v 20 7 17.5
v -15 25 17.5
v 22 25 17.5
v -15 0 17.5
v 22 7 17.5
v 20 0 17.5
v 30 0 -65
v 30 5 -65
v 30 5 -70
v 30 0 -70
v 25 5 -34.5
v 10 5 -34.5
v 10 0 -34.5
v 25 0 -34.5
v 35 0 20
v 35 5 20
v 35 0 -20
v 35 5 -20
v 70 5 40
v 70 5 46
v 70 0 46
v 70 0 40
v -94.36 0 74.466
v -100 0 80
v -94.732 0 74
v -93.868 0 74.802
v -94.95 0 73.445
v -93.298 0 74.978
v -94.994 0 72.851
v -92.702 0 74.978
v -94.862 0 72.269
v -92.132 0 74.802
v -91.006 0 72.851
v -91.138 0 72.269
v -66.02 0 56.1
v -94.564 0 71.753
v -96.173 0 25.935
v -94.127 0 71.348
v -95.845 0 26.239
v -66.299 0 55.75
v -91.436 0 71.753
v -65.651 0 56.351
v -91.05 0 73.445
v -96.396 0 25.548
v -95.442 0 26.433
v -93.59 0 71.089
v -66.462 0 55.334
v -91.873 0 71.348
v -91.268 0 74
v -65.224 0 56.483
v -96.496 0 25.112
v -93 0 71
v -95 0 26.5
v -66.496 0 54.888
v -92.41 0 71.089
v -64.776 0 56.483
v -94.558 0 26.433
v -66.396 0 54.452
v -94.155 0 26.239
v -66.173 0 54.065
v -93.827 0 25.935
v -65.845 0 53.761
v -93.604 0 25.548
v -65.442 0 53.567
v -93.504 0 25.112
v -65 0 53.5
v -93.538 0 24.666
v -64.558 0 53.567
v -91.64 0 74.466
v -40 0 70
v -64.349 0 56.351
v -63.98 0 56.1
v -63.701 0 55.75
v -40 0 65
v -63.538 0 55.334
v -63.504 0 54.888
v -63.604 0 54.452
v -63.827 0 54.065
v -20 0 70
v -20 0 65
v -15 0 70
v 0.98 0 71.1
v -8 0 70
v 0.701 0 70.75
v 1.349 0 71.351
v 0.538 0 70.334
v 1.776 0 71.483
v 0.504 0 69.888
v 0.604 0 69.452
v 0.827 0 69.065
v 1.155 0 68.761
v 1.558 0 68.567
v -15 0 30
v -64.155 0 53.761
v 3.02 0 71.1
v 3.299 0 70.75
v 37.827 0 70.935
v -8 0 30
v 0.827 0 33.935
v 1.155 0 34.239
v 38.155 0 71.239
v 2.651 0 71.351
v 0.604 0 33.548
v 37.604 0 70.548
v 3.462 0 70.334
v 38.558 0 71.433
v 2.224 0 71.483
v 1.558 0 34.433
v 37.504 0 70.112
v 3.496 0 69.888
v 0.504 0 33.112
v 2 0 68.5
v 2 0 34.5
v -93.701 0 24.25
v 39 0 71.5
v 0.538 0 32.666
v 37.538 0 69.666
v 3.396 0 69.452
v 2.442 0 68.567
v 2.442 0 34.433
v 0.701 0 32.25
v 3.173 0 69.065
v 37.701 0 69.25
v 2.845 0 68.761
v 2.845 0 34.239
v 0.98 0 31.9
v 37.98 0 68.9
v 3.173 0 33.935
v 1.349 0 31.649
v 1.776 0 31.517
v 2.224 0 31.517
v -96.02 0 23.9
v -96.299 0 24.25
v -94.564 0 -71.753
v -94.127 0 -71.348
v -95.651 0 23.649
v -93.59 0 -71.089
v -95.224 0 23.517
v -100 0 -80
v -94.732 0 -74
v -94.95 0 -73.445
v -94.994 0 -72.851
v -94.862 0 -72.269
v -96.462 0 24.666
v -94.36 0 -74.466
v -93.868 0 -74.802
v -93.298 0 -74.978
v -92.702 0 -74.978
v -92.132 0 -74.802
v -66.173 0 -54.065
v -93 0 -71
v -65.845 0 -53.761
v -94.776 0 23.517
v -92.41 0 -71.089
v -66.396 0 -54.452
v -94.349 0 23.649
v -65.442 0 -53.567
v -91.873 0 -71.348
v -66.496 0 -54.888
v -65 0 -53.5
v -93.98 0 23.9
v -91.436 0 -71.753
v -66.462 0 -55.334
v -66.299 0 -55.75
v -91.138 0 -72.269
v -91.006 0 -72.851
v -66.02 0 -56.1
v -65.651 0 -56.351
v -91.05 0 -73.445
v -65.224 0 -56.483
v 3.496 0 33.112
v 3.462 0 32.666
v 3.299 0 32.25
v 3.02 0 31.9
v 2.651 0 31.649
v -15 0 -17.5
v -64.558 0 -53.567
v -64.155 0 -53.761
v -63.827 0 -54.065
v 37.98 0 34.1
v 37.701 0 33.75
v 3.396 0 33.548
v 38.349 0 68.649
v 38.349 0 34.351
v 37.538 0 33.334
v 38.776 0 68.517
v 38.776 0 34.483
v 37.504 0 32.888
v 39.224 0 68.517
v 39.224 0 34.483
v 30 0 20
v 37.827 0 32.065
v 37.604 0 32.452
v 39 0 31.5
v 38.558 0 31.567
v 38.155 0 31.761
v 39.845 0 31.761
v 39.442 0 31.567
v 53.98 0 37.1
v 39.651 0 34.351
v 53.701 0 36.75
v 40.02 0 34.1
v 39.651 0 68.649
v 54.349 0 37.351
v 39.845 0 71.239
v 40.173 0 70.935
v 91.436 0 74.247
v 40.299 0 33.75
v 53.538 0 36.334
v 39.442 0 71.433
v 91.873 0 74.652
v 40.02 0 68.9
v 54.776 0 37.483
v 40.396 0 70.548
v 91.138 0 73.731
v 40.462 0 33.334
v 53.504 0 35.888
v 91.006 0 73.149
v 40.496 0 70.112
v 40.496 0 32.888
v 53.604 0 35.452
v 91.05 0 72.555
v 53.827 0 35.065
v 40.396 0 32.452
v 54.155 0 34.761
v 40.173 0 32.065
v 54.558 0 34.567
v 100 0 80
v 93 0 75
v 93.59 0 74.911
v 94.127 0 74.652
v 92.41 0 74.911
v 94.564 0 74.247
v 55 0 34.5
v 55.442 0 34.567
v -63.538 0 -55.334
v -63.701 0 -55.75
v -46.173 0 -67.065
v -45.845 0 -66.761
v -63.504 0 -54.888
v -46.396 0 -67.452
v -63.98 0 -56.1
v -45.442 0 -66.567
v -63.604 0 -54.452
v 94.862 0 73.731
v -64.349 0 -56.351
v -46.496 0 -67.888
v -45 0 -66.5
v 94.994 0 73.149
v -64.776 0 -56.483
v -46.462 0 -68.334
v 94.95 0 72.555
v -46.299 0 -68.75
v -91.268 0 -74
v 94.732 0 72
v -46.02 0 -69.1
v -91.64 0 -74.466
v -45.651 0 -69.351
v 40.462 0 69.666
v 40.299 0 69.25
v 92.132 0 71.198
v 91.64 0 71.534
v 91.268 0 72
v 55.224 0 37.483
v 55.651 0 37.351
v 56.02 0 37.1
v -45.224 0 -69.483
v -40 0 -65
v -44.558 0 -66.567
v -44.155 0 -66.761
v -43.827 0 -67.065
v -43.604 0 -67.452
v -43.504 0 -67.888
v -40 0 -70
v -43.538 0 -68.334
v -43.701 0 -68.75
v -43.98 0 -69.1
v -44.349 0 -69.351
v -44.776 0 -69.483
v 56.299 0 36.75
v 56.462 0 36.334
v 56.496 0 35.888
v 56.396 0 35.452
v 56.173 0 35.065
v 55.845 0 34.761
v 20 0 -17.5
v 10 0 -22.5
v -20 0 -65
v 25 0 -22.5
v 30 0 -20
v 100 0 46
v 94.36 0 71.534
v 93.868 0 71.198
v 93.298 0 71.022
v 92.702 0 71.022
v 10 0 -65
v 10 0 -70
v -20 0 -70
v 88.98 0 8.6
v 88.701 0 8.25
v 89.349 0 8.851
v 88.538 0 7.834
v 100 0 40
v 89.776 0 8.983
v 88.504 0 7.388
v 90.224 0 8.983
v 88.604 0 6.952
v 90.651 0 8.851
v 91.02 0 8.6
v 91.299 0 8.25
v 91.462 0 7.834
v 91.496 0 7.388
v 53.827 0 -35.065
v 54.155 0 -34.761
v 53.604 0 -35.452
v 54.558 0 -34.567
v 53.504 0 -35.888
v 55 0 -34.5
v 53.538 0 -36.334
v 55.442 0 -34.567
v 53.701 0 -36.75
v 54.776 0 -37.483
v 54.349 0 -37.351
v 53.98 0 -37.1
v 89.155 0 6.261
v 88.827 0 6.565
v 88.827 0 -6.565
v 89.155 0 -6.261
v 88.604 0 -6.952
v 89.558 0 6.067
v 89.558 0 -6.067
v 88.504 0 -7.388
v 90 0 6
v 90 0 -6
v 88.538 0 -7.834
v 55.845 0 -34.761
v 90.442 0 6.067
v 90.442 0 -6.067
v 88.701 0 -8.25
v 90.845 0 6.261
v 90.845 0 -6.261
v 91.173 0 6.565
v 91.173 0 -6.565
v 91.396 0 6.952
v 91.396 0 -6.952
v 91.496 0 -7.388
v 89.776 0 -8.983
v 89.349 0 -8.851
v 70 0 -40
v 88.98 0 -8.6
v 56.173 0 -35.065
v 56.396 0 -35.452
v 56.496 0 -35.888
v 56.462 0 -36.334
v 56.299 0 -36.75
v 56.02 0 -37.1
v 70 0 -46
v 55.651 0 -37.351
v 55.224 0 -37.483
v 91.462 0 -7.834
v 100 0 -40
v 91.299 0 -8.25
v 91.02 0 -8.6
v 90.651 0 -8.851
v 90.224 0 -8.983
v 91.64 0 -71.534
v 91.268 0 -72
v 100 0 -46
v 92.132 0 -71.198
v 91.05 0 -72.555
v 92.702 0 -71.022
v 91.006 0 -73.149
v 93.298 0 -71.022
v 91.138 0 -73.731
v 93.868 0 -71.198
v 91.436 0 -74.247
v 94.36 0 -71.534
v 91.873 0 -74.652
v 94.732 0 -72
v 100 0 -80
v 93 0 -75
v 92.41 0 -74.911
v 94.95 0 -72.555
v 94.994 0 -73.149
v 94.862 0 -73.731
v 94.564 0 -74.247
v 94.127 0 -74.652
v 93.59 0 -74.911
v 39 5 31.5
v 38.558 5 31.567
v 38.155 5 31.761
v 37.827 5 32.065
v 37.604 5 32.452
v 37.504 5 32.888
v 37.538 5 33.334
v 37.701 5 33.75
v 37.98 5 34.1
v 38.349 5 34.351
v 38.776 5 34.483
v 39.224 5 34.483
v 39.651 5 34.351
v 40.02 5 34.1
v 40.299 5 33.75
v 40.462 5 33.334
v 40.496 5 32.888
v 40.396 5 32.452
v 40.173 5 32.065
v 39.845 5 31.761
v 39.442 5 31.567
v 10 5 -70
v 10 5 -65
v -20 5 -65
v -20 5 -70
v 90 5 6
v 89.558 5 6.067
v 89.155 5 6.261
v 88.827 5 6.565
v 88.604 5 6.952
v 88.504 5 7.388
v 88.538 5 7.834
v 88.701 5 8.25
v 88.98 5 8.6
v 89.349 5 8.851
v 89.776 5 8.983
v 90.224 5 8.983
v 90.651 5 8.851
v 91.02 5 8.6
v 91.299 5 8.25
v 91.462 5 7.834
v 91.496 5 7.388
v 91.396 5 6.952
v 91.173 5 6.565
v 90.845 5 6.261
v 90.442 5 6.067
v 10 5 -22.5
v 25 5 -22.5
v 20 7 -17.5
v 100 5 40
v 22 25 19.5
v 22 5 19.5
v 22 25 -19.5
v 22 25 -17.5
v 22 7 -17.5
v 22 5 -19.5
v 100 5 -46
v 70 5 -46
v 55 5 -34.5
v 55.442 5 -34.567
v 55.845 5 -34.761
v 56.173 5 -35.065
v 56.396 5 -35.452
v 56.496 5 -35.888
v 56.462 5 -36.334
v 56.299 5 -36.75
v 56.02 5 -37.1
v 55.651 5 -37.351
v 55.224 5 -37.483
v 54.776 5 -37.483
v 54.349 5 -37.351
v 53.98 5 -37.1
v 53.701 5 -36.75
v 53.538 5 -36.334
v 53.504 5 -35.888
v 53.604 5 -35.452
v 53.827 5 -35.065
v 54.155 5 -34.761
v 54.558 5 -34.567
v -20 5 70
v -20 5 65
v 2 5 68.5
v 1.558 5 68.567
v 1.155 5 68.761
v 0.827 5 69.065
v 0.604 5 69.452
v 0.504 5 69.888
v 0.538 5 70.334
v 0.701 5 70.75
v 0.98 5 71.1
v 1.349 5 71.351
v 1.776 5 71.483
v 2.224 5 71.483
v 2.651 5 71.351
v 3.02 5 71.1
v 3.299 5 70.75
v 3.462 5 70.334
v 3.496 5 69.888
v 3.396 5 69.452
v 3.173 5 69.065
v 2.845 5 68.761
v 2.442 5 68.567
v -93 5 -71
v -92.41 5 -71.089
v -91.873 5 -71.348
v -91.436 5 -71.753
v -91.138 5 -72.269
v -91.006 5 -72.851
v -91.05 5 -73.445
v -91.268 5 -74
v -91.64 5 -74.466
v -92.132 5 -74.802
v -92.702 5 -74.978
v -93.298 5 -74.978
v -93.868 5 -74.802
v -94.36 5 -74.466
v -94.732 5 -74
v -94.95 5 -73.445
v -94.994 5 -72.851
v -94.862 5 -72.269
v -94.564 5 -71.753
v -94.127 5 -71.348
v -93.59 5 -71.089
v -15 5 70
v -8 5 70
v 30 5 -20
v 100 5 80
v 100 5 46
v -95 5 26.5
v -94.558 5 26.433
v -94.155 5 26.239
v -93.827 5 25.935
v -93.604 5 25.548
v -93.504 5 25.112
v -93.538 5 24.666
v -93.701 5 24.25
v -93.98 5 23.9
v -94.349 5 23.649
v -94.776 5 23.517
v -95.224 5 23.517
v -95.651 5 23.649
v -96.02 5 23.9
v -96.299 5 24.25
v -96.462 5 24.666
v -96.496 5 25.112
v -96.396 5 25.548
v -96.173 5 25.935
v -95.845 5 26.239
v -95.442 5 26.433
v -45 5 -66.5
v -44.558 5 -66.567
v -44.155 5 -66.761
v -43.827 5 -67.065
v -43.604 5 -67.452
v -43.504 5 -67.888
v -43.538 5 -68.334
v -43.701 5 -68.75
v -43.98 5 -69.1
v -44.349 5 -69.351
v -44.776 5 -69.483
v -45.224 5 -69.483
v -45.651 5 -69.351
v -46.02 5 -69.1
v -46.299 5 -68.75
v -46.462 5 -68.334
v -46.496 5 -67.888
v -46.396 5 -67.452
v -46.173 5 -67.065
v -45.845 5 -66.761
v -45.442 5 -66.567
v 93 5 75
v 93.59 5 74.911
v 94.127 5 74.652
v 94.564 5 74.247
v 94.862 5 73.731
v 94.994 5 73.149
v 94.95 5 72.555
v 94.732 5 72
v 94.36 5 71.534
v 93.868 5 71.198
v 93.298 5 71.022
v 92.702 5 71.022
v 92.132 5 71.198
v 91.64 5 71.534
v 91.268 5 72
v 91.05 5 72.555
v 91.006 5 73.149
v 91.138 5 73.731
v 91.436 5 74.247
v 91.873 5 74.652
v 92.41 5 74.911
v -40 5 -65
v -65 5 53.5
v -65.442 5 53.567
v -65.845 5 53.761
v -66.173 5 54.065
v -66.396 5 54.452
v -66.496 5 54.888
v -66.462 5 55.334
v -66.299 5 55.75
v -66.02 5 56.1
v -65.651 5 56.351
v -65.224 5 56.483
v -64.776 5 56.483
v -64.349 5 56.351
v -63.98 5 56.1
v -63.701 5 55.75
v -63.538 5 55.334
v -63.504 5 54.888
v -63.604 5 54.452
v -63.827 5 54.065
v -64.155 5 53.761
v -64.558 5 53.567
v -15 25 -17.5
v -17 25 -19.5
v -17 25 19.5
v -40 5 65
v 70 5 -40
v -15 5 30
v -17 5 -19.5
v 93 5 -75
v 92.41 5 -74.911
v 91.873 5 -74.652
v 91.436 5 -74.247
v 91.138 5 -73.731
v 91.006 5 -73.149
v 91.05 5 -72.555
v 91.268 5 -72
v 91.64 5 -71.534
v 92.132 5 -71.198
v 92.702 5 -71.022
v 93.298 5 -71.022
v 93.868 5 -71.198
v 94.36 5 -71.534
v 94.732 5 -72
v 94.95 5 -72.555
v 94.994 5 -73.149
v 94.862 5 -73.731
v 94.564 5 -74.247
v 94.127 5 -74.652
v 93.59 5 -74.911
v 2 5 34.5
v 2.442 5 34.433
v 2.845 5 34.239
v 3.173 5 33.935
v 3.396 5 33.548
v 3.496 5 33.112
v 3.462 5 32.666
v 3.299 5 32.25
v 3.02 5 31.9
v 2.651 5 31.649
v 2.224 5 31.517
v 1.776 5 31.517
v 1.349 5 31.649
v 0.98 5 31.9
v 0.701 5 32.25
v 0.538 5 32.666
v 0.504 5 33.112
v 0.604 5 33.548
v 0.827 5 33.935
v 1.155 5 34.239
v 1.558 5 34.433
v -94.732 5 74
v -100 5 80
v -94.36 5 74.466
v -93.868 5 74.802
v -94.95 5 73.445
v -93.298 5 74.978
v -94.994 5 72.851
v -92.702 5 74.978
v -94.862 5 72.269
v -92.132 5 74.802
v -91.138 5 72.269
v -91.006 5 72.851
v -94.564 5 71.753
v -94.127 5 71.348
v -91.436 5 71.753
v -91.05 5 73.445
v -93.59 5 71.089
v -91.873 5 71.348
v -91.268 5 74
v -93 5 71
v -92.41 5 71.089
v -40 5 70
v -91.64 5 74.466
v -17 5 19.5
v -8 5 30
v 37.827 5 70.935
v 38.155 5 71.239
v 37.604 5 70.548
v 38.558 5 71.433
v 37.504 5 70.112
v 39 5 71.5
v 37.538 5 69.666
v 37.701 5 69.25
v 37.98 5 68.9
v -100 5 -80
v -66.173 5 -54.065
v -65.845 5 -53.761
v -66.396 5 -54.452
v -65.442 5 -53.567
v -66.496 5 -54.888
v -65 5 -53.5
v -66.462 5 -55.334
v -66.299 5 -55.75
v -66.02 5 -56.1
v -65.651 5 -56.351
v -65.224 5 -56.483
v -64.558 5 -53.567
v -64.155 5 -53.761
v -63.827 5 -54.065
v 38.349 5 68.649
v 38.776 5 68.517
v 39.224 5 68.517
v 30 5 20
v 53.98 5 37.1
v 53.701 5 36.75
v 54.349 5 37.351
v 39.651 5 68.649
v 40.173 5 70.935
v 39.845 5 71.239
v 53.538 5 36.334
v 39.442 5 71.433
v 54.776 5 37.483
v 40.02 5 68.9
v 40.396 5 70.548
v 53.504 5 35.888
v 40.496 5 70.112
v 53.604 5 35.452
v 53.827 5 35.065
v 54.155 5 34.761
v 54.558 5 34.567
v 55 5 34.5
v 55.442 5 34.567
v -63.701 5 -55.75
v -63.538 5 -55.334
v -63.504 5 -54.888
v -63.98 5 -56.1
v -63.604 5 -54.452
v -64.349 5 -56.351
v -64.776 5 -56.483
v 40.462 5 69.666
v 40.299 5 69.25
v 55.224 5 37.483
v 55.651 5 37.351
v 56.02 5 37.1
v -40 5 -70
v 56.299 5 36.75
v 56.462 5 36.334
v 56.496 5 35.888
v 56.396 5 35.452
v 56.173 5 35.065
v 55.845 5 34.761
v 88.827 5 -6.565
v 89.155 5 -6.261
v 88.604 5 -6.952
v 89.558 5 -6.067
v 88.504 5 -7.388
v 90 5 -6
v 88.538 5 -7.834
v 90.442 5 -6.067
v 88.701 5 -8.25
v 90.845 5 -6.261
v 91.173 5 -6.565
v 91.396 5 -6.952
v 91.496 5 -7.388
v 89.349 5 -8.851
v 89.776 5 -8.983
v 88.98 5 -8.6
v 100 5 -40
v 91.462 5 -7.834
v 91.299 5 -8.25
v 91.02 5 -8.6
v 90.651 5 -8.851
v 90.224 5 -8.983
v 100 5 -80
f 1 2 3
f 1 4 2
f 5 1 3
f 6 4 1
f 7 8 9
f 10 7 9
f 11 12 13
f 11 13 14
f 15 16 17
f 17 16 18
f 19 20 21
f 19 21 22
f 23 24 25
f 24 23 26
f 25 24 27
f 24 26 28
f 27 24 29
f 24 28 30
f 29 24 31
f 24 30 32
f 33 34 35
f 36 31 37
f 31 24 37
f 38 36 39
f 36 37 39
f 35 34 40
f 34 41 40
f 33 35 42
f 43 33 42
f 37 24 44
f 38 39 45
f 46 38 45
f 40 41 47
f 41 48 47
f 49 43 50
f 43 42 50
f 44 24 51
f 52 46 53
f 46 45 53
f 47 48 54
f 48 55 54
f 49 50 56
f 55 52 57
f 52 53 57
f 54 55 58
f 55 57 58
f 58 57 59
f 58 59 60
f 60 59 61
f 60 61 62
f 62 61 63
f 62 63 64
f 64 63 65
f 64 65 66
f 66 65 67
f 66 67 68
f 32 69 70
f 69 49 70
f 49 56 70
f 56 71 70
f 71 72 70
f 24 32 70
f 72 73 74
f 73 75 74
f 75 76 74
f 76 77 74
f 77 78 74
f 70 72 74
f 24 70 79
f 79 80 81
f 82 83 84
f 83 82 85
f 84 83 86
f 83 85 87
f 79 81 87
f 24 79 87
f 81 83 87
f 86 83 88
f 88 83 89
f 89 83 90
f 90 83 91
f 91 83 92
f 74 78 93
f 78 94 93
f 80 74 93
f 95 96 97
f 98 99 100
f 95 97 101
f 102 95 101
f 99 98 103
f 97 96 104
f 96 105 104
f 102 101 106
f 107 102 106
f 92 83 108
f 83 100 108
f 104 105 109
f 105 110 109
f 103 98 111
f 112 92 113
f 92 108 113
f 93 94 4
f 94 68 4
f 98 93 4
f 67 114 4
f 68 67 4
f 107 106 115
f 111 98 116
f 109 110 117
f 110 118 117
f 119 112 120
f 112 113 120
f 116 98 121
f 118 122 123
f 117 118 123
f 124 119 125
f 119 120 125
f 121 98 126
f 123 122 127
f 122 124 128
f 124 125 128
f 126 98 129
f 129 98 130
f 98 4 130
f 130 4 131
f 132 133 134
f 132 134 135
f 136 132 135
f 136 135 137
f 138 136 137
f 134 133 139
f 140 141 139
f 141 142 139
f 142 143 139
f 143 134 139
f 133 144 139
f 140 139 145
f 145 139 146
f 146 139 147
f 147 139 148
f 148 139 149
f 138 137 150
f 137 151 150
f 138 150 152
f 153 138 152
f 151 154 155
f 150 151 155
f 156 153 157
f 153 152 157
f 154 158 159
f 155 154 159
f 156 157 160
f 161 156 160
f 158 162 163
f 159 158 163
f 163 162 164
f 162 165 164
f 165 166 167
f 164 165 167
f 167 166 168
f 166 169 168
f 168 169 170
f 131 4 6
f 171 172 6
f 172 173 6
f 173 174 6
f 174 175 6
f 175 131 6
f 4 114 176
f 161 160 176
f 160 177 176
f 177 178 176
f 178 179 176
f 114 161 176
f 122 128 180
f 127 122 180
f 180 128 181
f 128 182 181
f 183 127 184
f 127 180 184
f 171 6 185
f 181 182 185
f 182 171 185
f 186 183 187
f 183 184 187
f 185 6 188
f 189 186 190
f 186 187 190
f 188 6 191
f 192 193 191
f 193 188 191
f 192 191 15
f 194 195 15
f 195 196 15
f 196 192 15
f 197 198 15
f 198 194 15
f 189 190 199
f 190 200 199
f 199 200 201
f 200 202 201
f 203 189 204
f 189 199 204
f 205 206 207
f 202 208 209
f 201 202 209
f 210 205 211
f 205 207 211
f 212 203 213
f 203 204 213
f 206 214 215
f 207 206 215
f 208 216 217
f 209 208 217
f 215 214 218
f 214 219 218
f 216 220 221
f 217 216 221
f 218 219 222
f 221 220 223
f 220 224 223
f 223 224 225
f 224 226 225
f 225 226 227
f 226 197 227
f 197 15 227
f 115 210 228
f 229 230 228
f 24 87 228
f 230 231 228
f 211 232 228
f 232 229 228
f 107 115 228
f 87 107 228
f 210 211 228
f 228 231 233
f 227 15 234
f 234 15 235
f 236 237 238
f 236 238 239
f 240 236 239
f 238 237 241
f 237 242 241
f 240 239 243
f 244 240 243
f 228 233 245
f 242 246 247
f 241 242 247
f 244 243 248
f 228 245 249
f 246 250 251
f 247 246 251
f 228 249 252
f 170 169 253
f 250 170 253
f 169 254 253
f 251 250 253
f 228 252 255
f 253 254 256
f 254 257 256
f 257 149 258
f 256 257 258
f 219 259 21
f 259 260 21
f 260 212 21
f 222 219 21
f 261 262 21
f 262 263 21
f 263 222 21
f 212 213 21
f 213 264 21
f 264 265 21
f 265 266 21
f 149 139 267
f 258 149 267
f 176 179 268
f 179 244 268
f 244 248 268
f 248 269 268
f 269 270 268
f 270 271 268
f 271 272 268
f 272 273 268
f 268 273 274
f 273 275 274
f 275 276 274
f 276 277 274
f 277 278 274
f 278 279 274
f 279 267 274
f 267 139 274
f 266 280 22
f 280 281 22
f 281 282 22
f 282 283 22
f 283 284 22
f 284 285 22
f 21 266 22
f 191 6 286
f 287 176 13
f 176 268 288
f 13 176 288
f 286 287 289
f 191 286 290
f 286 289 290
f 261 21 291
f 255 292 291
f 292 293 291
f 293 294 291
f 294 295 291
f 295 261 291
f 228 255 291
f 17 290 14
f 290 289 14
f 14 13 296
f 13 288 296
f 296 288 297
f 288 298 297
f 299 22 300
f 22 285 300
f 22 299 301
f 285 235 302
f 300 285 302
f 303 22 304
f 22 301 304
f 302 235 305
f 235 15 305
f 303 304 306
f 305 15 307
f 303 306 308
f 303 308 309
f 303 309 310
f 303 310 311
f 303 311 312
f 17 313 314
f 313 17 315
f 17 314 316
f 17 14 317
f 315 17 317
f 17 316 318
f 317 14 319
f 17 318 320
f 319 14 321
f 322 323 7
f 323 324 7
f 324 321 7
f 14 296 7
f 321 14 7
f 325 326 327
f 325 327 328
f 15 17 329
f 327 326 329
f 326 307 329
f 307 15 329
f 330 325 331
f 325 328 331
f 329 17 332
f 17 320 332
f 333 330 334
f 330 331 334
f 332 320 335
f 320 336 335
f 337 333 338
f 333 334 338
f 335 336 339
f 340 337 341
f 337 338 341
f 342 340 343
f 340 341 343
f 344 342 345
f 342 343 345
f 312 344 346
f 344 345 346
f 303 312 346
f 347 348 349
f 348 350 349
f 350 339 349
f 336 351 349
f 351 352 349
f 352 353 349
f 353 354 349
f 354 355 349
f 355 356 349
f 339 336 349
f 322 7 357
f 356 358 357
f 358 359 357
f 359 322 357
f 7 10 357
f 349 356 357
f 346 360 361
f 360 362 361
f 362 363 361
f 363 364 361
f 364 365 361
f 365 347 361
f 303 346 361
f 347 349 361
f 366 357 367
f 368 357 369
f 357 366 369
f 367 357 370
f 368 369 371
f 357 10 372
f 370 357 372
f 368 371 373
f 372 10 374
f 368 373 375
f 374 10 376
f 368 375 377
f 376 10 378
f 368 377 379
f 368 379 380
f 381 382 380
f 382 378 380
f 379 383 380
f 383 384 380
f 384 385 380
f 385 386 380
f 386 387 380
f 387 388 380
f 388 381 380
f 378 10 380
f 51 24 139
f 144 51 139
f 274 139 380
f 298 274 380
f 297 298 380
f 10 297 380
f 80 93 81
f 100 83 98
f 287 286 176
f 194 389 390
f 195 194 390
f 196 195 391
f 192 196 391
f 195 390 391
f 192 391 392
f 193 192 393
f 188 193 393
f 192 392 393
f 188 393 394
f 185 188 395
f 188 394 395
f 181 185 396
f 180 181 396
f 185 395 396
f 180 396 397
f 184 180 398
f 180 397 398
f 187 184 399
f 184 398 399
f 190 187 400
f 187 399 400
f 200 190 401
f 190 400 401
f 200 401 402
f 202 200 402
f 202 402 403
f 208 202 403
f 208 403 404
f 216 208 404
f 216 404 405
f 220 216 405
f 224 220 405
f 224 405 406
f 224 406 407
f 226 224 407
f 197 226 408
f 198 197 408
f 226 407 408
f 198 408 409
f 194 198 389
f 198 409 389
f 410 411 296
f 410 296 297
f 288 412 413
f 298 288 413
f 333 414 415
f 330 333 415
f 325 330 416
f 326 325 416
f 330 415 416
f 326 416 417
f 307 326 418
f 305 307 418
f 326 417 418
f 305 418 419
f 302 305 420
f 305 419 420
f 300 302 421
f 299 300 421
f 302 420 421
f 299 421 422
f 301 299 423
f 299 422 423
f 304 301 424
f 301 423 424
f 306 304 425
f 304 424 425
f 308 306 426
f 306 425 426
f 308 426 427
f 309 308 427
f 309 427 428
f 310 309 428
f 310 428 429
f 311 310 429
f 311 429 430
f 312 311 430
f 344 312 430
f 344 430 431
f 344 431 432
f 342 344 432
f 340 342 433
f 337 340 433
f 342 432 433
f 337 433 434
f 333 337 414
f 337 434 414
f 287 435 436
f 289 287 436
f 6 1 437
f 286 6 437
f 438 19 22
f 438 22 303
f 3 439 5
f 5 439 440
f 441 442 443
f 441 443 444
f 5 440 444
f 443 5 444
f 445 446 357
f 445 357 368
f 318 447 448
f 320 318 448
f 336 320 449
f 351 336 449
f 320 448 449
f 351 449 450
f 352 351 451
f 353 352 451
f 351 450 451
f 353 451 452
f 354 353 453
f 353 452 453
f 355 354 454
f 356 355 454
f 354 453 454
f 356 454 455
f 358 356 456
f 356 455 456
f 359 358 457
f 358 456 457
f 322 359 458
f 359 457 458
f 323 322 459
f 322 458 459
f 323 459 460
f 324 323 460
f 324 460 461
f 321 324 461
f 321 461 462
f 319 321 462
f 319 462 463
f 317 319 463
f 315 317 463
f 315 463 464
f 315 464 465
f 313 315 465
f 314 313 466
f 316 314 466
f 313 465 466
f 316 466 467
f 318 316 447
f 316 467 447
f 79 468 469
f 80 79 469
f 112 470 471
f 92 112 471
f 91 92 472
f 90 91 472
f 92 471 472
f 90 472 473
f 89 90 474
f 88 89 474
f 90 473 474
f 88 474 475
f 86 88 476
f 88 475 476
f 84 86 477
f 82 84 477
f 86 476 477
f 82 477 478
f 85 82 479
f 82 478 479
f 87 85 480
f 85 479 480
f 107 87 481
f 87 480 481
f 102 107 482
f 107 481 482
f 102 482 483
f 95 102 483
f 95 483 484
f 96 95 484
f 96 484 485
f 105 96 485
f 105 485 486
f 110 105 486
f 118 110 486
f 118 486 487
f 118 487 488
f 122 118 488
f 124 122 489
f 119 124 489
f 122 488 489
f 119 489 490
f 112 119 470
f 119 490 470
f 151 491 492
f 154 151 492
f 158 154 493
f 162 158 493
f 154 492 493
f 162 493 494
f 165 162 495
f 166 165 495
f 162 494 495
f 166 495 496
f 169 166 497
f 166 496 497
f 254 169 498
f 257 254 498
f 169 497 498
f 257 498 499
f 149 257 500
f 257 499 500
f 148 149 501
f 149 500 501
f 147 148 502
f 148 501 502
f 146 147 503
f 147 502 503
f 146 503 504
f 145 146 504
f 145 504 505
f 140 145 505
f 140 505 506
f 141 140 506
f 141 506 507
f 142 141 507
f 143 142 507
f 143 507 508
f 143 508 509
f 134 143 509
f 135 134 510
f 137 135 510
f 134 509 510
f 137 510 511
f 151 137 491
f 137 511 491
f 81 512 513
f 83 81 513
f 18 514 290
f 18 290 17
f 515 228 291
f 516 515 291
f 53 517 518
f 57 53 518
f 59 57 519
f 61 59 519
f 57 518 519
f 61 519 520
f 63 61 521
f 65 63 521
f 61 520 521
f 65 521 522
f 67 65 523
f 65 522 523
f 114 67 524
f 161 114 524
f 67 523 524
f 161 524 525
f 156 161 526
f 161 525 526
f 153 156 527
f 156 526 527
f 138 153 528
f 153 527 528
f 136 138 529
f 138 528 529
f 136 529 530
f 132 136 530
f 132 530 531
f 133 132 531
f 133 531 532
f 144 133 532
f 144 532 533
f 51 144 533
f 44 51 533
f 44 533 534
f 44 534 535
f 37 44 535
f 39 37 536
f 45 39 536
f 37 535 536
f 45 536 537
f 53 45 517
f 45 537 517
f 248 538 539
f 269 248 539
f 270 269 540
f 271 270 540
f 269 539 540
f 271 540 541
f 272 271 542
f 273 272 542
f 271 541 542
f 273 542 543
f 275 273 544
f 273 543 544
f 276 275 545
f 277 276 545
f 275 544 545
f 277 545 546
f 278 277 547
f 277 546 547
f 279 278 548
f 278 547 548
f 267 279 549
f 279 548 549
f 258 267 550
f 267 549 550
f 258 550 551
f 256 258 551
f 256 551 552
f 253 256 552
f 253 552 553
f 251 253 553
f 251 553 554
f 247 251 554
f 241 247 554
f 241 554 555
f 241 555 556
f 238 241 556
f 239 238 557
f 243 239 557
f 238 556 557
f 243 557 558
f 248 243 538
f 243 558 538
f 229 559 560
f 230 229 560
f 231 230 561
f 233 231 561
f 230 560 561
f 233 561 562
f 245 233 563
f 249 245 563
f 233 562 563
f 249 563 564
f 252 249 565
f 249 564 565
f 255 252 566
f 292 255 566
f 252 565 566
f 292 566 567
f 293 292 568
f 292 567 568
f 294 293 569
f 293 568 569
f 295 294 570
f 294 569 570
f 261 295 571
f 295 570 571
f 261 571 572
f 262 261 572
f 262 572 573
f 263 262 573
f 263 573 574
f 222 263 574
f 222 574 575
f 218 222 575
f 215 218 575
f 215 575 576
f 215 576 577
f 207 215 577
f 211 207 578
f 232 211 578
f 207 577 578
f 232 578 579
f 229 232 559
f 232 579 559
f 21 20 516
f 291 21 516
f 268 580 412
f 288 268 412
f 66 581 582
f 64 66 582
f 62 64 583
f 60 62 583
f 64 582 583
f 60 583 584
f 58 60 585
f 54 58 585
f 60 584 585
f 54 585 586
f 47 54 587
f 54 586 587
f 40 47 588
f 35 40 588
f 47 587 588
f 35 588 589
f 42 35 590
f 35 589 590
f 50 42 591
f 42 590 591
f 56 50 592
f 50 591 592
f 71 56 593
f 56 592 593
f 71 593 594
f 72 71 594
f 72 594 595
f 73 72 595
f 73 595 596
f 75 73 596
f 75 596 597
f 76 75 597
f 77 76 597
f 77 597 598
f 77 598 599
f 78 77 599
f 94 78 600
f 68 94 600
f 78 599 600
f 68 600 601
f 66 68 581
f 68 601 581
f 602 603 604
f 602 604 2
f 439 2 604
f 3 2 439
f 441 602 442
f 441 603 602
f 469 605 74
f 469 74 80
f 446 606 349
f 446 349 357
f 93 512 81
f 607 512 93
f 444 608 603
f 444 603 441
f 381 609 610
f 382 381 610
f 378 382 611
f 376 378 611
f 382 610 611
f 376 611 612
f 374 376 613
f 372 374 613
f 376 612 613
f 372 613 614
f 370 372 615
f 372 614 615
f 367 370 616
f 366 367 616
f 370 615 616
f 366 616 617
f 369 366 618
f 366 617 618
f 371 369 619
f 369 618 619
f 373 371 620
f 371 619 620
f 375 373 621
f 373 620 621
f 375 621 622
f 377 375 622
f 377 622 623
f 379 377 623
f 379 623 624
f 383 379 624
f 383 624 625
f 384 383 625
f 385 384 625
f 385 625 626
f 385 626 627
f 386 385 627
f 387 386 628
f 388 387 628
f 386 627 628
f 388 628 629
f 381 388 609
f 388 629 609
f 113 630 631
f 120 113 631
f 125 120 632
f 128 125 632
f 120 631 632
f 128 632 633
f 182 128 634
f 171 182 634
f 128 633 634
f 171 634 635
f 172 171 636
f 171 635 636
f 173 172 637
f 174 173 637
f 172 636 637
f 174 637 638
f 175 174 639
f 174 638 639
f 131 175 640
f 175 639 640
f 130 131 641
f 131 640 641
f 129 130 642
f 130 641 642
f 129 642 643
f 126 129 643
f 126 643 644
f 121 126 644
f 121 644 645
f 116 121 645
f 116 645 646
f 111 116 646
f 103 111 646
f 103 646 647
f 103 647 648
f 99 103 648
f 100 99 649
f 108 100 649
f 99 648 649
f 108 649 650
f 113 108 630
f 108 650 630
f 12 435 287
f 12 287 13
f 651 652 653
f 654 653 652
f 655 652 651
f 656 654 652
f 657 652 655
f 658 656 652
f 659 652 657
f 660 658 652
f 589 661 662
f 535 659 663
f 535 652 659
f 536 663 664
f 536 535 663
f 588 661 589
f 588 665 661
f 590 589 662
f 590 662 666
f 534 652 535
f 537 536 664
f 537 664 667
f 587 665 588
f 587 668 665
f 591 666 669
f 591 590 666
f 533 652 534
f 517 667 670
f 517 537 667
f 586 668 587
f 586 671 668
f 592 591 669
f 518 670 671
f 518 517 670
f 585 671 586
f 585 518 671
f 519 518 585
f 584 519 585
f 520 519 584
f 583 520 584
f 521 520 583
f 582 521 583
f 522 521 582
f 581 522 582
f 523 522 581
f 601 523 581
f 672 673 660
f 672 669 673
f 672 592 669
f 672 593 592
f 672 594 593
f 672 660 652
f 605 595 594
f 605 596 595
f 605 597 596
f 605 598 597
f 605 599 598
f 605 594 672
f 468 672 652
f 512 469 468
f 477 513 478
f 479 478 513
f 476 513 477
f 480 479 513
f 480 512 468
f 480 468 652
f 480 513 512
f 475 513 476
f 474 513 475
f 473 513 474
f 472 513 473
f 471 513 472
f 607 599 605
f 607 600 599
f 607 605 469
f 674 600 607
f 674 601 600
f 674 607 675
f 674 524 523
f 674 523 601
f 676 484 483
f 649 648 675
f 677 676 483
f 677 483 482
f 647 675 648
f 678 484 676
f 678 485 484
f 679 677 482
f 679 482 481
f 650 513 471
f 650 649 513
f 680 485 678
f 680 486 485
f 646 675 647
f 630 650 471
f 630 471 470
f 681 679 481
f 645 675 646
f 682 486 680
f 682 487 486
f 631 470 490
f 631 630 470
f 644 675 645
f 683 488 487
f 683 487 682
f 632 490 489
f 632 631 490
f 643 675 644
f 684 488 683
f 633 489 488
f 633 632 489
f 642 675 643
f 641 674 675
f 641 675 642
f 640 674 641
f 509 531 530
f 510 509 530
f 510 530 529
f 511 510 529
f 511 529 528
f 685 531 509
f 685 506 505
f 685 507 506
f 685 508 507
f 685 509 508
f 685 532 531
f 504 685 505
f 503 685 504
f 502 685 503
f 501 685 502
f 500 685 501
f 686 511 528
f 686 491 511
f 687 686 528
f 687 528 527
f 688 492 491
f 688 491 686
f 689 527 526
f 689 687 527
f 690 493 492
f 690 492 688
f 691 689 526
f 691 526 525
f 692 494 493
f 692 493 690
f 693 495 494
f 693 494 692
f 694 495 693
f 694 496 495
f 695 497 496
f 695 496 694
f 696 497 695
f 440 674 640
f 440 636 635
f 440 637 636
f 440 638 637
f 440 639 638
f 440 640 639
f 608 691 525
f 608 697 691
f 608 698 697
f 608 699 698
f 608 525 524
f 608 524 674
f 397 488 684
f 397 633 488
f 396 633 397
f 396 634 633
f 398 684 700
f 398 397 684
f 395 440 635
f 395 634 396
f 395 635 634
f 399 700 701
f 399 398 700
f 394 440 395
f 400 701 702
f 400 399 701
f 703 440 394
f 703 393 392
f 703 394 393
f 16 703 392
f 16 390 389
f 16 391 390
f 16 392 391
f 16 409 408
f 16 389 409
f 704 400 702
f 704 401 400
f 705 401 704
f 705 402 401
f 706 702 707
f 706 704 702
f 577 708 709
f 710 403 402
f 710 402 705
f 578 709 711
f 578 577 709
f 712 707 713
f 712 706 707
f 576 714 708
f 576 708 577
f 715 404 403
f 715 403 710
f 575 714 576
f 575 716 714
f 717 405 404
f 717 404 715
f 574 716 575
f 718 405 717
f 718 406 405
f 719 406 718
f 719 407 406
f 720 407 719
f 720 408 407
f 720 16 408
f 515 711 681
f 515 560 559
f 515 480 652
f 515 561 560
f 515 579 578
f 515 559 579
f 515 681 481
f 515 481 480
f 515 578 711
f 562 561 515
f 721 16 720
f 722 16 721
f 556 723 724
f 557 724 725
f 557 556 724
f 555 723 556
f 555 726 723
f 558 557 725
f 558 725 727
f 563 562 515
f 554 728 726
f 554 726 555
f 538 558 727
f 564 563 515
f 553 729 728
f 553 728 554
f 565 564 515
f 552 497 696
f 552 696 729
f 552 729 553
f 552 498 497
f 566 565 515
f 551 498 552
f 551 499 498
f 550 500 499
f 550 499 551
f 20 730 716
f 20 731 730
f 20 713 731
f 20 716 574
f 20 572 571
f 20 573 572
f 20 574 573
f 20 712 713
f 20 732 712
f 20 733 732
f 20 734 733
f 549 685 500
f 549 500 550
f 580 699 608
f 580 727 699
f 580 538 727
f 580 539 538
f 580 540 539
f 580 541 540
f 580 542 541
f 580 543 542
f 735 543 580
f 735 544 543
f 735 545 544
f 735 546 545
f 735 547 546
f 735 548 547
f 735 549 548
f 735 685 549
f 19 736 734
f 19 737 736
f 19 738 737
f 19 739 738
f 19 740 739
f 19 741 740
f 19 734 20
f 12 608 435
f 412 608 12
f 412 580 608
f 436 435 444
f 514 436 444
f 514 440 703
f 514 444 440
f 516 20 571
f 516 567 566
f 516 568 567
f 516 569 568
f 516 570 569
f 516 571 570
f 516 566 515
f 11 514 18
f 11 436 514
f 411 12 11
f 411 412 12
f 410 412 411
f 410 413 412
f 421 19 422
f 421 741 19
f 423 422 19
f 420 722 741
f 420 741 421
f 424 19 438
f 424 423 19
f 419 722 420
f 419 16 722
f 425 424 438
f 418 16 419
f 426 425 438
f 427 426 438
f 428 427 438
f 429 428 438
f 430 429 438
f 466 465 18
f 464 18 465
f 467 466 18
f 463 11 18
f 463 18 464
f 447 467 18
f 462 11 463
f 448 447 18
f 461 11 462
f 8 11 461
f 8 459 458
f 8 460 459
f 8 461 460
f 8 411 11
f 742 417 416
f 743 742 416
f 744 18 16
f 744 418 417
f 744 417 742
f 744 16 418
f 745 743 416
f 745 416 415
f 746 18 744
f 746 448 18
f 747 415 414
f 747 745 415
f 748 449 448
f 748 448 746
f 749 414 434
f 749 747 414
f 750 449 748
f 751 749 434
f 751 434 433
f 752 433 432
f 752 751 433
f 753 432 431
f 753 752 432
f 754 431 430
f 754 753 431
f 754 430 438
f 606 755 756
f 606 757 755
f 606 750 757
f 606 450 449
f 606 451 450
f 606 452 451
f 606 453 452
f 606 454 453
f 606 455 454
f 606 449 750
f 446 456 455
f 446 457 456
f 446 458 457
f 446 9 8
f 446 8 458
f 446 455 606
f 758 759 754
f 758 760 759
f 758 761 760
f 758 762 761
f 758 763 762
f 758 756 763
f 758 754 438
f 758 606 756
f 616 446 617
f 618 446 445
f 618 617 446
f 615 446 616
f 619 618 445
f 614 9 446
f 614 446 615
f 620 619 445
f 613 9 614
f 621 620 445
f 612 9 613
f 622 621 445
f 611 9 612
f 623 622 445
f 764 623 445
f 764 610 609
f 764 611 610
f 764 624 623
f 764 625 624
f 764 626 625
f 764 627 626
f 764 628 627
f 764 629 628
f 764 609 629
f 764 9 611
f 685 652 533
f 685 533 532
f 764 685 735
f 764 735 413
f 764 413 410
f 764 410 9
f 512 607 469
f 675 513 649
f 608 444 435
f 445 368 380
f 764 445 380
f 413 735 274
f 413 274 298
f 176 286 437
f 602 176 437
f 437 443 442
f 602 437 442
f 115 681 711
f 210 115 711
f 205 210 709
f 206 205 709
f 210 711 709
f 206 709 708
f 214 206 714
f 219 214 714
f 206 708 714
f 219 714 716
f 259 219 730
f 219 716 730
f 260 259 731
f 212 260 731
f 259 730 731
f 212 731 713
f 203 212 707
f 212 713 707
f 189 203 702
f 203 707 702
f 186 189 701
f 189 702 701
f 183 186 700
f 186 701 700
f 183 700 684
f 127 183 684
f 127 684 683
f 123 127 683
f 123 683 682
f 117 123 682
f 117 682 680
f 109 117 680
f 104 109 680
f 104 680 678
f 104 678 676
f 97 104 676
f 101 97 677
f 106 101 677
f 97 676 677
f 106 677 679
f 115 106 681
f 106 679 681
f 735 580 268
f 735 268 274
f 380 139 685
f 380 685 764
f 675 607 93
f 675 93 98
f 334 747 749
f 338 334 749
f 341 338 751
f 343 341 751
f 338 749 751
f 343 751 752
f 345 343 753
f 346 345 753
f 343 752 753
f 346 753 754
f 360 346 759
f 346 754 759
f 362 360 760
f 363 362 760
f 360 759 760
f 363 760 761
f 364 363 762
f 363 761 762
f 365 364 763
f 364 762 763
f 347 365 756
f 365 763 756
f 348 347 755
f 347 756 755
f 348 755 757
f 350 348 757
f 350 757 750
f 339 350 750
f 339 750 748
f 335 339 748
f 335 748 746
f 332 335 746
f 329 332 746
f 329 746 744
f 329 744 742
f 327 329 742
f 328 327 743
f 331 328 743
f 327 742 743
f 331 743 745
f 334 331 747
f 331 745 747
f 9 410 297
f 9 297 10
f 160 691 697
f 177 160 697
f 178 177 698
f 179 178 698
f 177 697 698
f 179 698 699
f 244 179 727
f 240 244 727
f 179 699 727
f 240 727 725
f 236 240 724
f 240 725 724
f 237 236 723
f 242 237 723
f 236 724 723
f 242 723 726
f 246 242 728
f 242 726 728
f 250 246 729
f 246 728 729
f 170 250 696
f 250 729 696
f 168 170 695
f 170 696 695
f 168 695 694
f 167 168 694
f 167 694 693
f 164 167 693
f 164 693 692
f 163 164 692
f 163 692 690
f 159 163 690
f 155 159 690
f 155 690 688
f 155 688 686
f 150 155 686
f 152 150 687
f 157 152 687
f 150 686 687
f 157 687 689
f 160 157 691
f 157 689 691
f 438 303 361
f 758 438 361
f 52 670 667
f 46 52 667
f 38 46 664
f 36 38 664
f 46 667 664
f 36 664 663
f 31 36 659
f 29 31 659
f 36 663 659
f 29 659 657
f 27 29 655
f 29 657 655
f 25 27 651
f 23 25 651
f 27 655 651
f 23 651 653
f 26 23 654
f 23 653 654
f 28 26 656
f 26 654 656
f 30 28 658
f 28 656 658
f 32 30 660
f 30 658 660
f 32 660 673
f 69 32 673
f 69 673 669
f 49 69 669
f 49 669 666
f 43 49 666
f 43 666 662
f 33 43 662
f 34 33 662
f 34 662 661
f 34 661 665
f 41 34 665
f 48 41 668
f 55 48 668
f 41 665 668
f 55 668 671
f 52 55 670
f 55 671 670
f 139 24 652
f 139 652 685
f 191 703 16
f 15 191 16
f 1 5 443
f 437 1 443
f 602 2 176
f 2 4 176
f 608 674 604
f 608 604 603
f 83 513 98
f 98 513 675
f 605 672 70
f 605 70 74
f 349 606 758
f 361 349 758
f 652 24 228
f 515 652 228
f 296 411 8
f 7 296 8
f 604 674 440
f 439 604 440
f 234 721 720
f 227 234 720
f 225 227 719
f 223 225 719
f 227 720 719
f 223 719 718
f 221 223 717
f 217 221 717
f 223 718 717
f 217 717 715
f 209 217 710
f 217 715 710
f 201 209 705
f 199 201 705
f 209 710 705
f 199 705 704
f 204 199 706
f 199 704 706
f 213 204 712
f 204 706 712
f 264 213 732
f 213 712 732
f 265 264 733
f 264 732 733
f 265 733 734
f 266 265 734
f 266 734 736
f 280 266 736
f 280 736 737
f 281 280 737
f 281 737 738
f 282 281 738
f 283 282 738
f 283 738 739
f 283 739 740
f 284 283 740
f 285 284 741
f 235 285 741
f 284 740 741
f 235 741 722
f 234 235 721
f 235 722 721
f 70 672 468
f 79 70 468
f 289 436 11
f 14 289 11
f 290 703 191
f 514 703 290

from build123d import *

# Parameters (mm, degrees)
SKETCH1_W           = 200
SKETCH1_H           = 160
BOSS_EXTRUDE1_DEPTH = 5
SKETCH2_R           = 2
CUT_EXTRUDE1_DEPTH  = 5
SKETCH3_R           = 1.5
CUT_EXTRUDE4_DEPTH  = 5
SKETCH4_R           = 1.5
CUT_EXTRUDE5_DEPTH  = 5
SKETCH5_W           = 35
SKETCH5_H           = 35
CUT_EXTRUDE6_DEPTH  = 5
SKETCH7_W           = 7
SKETCH7_H           = 40
SKETCH7_W_2         = 5
SKETCH7_W_3         = 20
SKETCH7_H_2         = 5
CUT_EXTRUDE7_DEPTH  = 5
SKETCH8_W           = 15
SKETCH8_H           = 12
SKETCH8_W_2         = 30
SKETCH8_H_2         = 6
CUT_EXTRUDE8_DEPTH  = 5
SKETCH9_W           = 20
SKETCH9_H           = 5
CUT_EXTRUDE9_DEPTH  = 5
SKETCH10_R          = 1.5
CUT_EXTRUDE10_DEPTH = 5
SKETCH11_R          = 1.5
CUT_EXTRUDE11_DEPTH = 5
SKETCH12_R          = 1.5
CUT_EXTRUDE12_DEPTH = 5
SKETCH14_W          = 2
SKETCH14_H          = 35
BOSS_EXTRUDE3_DEPTH = 20
SKETCH15_W          = 39
SKETCH15_H          = 2
BOSS_EXTRUDE4_DEPTH = 20
SKETCH16_W          = 39
SKETCH16_H          = 2
BOSS_EXTRUDE5_DEPTH = 20
SKETCH17_W          = 35
SKETCH17_H          = 18
CUT_EXTRUDE13_DEPTH = 20


with BuildPart() as part:
    # Sketch1 → Boss-Extrude1 (new body)
    with BuildSketch(Plane(origin=(0, 0, 0), x_dir=(1, 0, 0), z_dir=(0, 1, 0))):
        Rectangle(SKETCH1_W, SKETCH1_H)
    extrude(amount=BOSS_EXTRUDE1_DEPTH)

    # Sketch2 → Cut-Extrude1 (cut)
    with BuildSketch(Plane(origin=(0, 5, 0), x_dir=(1, 0, 0), z_dir=(0, 1, 0))):
        with Locations(Location((-93, 73, 0), (0, 0, 270))):
            Circle(SKETCH2_R)
        with Locations(Location((93, 73, 0), (0, 0, 90))):
            Circle(SKETCH2_R)
        with Locations(Location((93, -73, 0), (0, 0, 270))):
            Circle(SKETCH2_R)
        with Locations(Location((-93, -73, 0), (0, 0, 90))):
            Circle(SKETCH2_R)
    extrude(amount=-CUT_EXTRUDE1_DEPTH, mode=Mode.SUBTRACT)

    # Sketch3 → Cut-Extrude4 (cut)
    with BuildSketch(Plane(origin=(0, 5, 0), x_dir=(1, 0, 0), z_dir=(0, 1, 0))):
        with Locations(Location((90, 7.5, 0), (0, 0, 270))):
            Circle(SKETCH3_R)
        with Locations(Location((90, -7.5, 0), (0, 0, 90))):
            Circle(SKETCH3_R)
    extrude(amount=-CUT_EXTRUDE4_DEPTH, mode=Mode.SUBTRACT)

    # Sketch4 → Cut-Extrude5 (cut)
    with BuildSketch(Plane(origin=(0, 5, 0), x_dir=(1, 0, 0), z_dir=(0, 1, 0))):
        with Locations(Location((55, 36, 0), (0, 0, 270))):
            Circle(SKETCH4_R)
        with Locations(Location((55, -36, 0), (0, 0, 90))):
            Circle(SKETCH4_R)
    extrude(amount=-CUT_EXTRUDE5_DEPTH, mode=Mode.SUBTRACT)

    # Sketch5 → Cut-Extrude6 (cut)
    with BuildSketch(Plane(origin=(0, 5, 0), x_dir=(1, 0, 0), z_dir=(0, 1, 0))):
        with Locations((2.5, 0)):
            Rectangle(SKETCH5_W, SKETCH5_H)
    extrude(amount=-CUT_EXTRUDE6_DEPTH, mode=Mode.SUBTRACT)

    # Sketch7 → Cut-Extrude7 (cut)
    with BuildSketch(Plane(origin=(0, 5, 0), x_dir=(1, 0, 0), z_dir=(0, 1, 0))):
        with Locations((-11.5, -50)):
            Rectangle(SKETCH7_W, SKETCH7_H)
        with Locations((32.5, 0)):
            Rectangle(SKETCH7_W_2, SKETCH7_H)
        with Locations((-30, 67.5)):
            Rectangle(SKETCH7_W_3, SKETCH7_H_2)
        with Locations((-30, -67.5)):
            Rectangle(SKETCH7_W_3, SKETCH7_H_2)
    extrude(amount=-CUT_EXTRUDE7_DEPTH, mode=Mode.SUBTRACT)

    # Sketch8 → Cut-Extrude8 (cut)
    with BuildSketch(Plane(origin=(0, 5, 0), x_dir=(1, 0, 0), z_dir=(0, 1, 0))):
        with Locations((17.5, 28.5)):
            Rectangle(SKETCH8_W, SKETCH8_H)
        with Locations((85, 43)):
            Rectangle(SKETCH8_W_2, SKETCH8_H_2)
        with Locations((85, -43)):
            Rectangle(SKETCH8_W_2, SKETCH8_H_2)
    extrude(amount=-CUT_EXTRUDE8_DEPTH, mode=Mode.SUBTRACT)

    # Sketch9 → Cut-Extrude9 (cut)
    with BuildSketch(Plane(origin=(0, 5, 0), x_dir=(1, 0, 0), z_dir=(0, 1, 0))):
        with Locations((20, 67.5)):
            Rectangle(SKETCH9_W, SKETCH9_H)
    extrude(amount=-CUT_EXTRUDE9_DEPTH, mode=Mode.SUBTRACT)

    # Sketch10 → Cut-Extrude10 (cut)
    with BuildSketch(Plane(origin=(0, 5, 0), x_dir=(1, 0, 0), z_dir=(0, 1, 0))):
        with Locations(Location((-95, -25, 0), (0, 0, 270))):
            Circle(SKETCH10_R)
        with Locations(Location((-45, 68, 0), (0, 0, 270))):
            Circle(SKETCH10_R)
    extrude(amount=-CUT_EXTRUDE10_DEPTH, mode=Mode.SUBTRACT)

    # Sketch11 → Cut-Extrude11 (cut)
    with BuildSketch(Plane(origin=(0, 5, 0), x_dir=(1, 0, 0), z_dir=(0, 1, 0))):
        with Locations(Location((2, -33, 0), (0, 0, 270))):
            Circle(SKETCH11_R)
        with Locations(Location((2, -70, 0), (0, 0, 90))):
            Circle(SKETCH11_R)
        with Locations(Location((39, -70, 0), (0, 0, 270))):
            Circle(SKETCH11_R)
        with Locations(Location((39, -33, 0), (0, 0, 90))):
            Circle(SKETCH11_R)
    extrude(amount=-CUT_EXTRUDE11_DEPTH, mode=Mode.SUBTRACT)

    # Sketch12 → Cut-Extrude12 (cut)
    with BuildSketch(Plane(origin=(0, 5, 0), x_dir=(1, 0, 0), z_dir=(0, 1, 0))):
        with Locations(Location((-65, 55, 0), (0, 0, 270))):
            Circle(SKETCH12_R)
        with Locations(Location((-65, -55, 0), (0, 0, 90))):
            Circle(SKETCH12_R)
    extrude(amount=-CUT_EXTRUDE12_DEPTH, mode=Mode.SUBTRACT)

    # Sketch14 → Boss-Extrude3 (add)
    with BuildSketch(Plane(origin=(0, 5, 0), x_dir=(1, 0, 0), z_dir=(0, 1, 0))):
        with Locations((-16, 0)):
            Rectangle(SKETCH14_W, SKETCH14_H)
        with Locations((21, 0)):
            Rectangle(SKETCH14_W, SKETCH14_H)
    extrude(amount=BOSS_EXTRUDE3_DEPTH)

    # Sketch15 → Boss-Extrude4 (add)
    with BuildSketch(Plane(origin=(0, 5, 0), x_dir=(1, 0, 0), z_dir=(0, 1, 0))):
        with Locations((2.5, -18.5)):
            Rectangle(SKETCH15_W, SKETCH15_H)
    extrude(amount=BOSS_EXTRUDE4_DEPTH)

    # Sketch16 → Boss-Extrude5 (add)
    with BuildSketch(Plane(origin=(0, 5, 0), x_dir=(1, 0, 0), z_dir=(0, 1, 0))):
        with Locations((2.5, 18.5)):
            Rectangle(SKETCH16_W, SKETCH16_H)
    extrude(amount=BOSS_EXTRUDE5_DEPTH)

    # Sketch17 → Cut-Extrude13 (cut)
    with BuildSketch(Plane(origin=(22, 0, 0), x_dir=(0, 0, -1), z_dir=(1, 0, 0))):
        with Locations((0, 16)):
            Rectangle(SKETCH17_W, SKETCH17_H)
    extrude(amount=-CUT_EXTRUDE13_DEPTH, mode=Mode.SUBTRACT)


solid = part.part
